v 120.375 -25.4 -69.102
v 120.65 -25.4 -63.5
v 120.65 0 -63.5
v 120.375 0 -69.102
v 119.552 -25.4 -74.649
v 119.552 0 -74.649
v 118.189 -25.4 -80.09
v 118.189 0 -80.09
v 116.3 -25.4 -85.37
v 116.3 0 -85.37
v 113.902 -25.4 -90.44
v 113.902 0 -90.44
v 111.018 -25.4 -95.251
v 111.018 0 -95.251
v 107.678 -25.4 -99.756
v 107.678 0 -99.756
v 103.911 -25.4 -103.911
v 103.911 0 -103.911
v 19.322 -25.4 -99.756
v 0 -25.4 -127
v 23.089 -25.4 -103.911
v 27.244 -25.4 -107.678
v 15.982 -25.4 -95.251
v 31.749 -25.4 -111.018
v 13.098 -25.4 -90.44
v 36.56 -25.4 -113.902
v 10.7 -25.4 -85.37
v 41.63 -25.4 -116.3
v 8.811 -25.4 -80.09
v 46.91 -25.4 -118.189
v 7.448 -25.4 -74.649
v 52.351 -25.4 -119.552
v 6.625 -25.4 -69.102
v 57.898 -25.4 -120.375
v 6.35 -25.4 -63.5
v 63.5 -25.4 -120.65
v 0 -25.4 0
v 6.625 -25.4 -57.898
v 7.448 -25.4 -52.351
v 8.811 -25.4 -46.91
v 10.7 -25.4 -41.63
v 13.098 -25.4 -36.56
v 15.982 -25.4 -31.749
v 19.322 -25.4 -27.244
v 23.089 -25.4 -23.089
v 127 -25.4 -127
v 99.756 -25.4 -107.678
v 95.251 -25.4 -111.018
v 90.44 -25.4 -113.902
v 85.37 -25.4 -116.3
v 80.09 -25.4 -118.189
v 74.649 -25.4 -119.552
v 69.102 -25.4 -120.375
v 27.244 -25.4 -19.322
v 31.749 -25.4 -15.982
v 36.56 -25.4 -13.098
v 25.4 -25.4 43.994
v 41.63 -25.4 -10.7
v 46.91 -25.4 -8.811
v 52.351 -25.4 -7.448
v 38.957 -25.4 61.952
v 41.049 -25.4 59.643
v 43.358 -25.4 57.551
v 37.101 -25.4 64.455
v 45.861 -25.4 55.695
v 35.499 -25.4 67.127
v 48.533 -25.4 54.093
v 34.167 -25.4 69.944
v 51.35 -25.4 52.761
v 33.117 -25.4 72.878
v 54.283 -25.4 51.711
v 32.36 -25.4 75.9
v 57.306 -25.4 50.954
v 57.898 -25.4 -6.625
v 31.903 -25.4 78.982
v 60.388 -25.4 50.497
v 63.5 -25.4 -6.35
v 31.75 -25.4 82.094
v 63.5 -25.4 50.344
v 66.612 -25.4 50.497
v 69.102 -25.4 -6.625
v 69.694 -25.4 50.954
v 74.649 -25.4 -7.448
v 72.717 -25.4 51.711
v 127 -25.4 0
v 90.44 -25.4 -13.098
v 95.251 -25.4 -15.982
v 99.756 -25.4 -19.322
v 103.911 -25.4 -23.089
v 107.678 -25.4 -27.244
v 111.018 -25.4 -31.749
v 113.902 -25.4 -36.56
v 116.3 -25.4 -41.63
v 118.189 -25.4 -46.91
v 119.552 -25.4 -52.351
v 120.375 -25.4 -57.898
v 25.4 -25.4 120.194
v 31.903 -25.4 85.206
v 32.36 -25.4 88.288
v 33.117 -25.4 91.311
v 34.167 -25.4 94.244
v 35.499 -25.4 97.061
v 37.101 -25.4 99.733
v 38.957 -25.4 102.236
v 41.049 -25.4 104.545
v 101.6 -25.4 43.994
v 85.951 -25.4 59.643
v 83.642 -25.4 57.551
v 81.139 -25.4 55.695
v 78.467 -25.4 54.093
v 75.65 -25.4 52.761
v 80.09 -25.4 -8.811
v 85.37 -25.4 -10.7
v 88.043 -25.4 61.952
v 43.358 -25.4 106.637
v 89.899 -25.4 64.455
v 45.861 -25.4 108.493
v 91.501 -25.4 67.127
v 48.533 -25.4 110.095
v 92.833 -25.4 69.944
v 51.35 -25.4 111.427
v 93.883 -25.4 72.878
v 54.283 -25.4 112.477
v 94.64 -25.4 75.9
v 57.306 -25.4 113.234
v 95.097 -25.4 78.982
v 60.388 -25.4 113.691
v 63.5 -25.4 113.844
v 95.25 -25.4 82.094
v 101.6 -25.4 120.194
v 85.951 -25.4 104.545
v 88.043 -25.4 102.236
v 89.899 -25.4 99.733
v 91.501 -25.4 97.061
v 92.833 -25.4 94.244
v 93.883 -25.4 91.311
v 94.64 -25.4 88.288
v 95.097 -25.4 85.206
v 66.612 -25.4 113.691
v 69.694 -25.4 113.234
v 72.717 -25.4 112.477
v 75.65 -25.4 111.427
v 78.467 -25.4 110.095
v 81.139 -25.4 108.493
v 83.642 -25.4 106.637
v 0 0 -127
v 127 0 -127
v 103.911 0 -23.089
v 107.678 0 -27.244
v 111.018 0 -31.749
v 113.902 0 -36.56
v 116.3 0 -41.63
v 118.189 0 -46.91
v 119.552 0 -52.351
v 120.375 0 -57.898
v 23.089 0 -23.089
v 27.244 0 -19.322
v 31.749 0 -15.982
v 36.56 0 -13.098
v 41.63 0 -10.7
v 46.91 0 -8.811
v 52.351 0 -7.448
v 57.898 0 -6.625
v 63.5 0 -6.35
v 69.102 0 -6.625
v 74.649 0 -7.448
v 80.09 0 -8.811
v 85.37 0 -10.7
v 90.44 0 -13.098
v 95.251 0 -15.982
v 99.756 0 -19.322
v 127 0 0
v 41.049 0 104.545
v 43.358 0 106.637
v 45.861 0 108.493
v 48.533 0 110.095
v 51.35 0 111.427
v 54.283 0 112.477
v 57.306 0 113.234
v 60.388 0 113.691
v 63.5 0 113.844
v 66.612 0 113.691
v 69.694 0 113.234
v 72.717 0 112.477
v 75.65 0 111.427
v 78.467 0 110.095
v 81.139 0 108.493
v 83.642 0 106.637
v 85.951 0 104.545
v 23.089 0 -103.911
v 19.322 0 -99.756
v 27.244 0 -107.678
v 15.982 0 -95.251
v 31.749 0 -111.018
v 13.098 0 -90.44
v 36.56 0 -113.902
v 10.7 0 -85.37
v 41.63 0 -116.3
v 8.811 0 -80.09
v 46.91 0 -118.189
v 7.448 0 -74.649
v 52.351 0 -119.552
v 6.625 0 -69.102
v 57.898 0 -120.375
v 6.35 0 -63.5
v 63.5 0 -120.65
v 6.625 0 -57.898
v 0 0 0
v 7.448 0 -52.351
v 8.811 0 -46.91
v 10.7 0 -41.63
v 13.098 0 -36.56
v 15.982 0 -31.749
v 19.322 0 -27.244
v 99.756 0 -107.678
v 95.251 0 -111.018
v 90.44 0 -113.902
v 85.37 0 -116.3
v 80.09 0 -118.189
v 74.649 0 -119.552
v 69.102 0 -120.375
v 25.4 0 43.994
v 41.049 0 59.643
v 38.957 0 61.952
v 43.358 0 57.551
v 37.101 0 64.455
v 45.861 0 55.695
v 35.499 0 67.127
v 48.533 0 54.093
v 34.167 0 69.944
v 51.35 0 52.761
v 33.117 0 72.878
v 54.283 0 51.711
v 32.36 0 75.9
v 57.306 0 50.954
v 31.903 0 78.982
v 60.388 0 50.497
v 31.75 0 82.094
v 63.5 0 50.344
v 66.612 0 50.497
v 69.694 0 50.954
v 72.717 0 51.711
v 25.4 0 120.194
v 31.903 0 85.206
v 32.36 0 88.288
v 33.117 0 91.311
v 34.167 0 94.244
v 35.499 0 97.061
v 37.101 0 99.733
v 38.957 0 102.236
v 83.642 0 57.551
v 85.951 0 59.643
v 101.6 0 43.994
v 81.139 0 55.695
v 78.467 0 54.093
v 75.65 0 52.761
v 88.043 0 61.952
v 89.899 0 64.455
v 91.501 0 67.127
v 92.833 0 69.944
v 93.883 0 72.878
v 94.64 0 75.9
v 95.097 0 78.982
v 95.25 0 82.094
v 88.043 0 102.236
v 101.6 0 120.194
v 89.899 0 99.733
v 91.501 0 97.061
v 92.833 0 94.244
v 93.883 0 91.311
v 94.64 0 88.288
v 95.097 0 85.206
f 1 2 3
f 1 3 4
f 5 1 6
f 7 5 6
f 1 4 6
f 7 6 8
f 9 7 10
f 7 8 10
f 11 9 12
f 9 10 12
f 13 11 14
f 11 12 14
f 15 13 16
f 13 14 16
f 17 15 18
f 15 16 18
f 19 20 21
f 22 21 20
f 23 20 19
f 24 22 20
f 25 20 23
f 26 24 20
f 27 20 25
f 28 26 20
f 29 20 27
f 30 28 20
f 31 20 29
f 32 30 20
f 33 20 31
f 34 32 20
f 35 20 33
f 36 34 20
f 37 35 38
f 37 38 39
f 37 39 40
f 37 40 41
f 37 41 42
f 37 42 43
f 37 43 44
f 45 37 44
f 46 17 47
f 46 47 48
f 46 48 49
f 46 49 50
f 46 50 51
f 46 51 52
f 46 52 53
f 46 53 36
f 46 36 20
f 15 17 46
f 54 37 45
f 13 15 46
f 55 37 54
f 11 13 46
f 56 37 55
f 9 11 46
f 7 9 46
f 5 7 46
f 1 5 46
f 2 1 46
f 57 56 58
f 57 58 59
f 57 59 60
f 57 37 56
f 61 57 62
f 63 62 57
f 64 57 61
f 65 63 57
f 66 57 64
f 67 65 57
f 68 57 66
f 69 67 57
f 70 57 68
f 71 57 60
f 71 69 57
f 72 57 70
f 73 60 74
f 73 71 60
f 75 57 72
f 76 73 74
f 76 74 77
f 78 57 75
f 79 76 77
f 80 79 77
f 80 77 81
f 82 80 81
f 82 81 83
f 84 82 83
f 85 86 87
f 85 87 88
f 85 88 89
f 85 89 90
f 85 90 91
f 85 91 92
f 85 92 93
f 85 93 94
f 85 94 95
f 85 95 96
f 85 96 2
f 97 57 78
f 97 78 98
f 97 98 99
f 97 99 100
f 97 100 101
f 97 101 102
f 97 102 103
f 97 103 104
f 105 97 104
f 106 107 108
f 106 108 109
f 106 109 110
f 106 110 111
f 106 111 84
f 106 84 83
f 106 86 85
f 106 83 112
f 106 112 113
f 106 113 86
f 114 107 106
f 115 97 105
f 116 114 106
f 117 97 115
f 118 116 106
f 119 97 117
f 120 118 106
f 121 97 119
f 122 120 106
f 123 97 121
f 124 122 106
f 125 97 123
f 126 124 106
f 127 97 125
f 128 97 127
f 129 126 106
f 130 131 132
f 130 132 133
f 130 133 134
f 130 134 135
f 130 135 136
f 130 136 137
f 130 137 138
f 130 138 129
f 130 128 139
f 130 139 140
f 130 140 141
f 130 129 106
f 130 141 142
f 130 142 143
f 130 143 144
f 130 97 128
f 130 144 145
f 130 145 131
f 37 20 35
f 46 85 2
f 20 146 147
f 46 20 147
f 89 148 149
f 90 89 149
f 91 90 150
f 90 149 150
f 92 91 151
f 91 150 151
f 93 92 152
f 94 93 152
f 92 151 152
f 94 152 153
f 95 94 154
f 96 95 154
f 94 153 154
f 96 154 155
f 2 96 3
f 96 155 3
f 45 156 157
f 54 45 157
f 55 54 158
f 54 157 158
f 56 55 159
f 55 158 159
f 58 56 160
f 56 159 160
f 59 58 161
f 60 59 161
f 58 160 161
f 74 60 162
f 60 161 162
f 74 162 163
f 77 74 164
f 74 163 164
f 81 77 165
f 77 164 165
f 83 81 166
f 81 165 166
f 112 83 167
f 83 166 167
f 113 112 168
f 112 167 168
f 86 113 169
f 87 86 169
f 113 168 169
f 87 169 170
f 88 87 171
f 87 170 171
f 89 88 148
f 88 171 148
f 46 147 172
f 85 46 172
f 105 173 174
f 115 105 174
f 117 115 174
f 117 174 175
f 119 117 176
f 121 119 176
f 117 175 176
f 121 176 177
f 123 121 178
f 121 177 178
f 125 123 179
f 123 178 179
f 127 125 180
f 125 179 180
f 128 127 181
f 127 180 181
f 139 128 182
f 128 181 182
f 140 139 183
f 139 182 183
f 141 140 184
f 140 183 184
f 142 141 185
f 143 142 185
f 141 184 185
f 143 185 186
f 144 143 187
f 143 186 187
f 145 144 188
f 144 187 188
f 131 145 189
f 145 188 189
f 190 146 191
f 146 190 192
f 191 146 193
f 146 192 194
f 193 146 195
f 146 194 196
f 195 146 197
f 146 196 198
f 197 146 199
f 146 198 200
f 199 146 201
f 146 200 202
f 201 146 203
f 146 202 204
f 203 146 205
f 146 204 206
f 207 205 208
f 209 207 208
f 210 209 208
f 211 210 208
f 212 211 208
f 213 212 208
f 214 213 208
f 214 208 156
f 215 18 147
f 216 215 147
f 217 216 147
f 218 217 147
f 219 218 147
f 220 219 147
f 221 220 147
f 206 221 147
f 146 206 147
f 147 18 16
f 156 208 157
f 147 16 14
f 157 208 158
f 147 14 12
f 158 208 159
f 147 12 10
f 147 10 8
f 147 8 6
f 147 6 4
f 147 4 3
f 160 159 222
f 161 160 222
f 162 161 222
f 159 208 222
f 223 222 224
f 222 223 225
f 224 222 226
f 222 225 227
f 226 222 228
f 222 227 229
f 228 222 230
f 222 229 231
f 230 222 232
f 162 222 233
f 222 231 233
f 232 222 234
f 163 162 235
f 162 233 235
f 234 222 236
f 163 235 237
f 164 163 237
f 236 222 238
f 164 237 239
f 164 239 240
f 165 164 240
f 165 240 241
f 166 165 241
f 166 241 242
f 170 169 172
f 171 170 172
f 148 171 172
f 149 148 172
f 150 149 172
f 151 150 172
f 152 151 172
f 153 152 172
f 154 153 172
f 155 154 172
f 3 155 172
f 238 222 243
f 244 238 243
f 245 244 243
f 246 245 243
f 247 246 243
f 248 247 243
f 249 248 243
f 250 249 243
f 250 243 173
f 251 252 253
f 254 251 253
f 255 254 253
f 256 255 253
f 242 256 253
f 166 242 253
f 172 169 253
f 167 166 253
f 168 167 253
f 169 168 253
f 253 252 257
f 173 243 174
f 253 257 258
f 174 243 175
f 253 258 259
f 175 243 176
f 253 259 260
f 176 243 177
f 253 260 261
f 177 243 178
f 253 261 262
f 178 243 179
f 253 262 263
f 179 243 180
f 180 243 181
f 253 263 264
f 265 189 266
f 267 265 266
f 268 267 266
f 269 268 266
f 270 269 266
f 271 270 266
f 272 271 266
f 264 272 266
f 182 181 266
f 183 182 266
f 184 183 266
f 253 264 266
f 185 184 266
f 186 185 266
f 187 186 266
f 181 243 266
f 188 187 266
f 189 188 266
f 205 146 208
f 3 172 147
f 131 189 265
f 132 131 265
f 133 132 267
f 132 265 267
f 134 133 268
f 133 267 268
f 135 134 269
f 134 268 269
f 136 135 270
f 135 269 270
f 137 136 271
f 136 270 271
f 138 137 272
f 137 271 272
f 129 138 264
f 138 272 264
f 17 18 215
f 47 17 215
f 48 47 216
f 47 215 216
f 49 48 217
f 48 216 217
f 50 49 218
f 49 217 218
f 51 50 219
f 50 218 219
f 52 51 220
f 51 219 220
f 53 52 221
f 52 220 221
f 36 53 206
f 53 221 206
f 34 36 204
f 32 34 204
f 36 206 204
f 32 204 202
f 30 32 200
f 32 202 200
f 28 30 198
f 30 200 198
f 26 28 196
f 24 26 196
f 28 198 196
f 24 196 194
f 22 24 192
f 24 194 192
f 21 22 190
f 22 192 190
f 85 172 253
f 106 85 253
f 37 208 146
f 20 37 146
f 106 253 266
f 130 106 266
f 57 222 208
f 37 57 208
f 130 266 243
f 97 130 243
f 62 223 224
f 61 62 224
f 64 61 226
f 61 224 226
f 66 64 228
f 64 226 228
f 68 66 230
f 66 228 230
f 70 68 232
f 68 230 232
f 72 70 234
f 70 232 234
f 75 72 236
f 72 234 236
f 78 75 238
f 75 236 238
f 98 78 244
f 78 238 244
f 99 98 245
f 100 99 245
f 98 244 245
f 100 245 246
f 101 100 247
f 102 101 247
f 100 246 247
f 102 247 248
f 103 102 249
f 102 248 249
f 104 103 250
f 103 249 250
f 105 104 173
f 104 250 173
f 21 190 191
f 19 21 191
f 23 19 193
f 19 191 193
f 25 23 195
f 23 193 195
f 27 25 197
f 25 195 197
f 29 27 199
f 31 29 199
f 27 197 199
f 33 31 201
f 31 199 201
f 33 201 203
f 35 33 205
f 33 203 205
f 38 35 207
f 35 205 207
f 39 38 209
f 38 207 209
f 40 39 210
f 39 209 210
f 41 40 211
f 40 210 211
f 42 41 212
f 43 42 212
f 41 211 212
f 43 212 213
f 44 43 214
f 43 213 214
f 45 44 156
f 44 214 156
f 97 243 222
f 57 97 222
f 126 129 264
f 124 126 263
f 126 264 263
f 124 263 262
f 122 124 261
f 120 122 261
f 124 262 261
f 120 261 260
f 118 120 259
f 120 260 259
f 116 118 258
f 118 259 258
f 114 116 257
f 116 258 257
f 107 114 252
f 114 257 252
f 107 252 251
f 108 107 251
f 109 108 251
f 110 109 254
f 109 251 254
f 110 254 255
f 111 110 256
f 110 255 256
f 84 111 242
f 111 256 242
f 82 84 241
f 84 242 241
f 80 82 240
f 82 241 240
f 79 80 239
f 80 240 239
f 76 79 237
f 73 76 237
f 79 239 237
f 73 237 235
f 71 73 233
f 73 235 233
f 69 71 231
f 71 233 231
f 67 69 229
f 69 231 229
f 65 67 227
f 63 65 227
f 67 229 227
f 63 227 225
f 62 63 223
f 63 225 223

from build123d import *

# Parameters (mm, degrees)
F1_DEPTH = 25.4


with BuildPart() as f1:
    # F0 (on Front) → F1 (new body)
    with BuildSketch(Plane.XZ):
        Polygon((25.4, 43.994091), (0, 0), (127, 0), (101.6, 43.994091), align=None)
        with BuildLine():
            Line((23.088847, -103.911153), (0, -127))
            Line((0, -127), (127, -127))
            Line((127, -127), (103.911153, -103.911153))
            ThreePointArc((103.911153, -103.911153), (63.5, -120.65), (23.088847, -103.911153))
        make_face()
        with BuildLine():
            Line((23.088847, -23.088847), (0, 0))
            Line((0, 0), (0, -127))
            Line((0, -127), (23.088847, -103.911153))
            ThreePointArc((23.088847, -103.911153), (6.35, -63.5), (23.088847, -23.088847))
        make_face()
        with BuildLine():
            Line((127, -127), (127, 0))
            Line((127, 0), (103.911153, -23.088847))
            ThreePointArc((103.911153, -23.088847), (116.299715, -41.629642), (120.65, -63.5))
            ThreePointArc((120.65, -63.5), (116.299715, -85.370358), (103.911153, -103.911153))
            Line((103.911153, -103.911153), (127, -127))
        make_face()
        with BuildLine():
            Line((25.4, 120.194091), (25.4, 43.994091))
            Line((25.4, 43.994091), (41.04936, 59.64345))
            ThreePointArc((41.04936, 59.64345), (31.75, 82.094091), (41.04936, 104.544731))
            Line((41.04936, 104.544731), (25.4, 120.194091))
        make_face()
        with BuildLine():
            Line((85.95064, 59.64345), (101.6, 43.994091))
            Line((101.6, 43.994091), (101.6, 120.194091))
            Line((101.6, 120.194091), (85.95064, 104.544731))
            ThreePointArc((85.95064, 104.544731), (92.833175, 94.244289), (95.25, 82.094091))
            ThreePointArc((95.25, 82.094091), (92.833175, 69.943892), (85.95064, 59.64345))
        make_face()
        with BuildLine():
            Line((127, 0), (0, 0))
            Line((0, 0), (23.088847, -23.088847))
            ThreePointArc((23.088847, -23.088847), (63.5, -6.35), (103.911153, -23.088847))
            Line((103.911153, -23.088847), (127, 0))
        make_face()
        with BuildLine():
            Line((41.04936, 59.64345), (25.4, 43.994091))
            Line((25.4, 43.994091), (101.6, 43.994091))
            Line((101.6, 43.994091), (85.95064, 59.64345))
            ThreePointArc((85.95064, 59.64345), (63.5, 50.344091), (41.04936, 59.64345))
        make_face()
        with BuildLine():
            Line((101.6, 120.194091), (25.4, 120.194091))
            Line((25.4, 120.194091), (41.04936, 104.544731))
            ThreePointArc((41.04936, 104.544731), (63.5, 113.844091), (85.95064, 104.544731))
            Line((85.95064, 104.544731), (101.6, 120.194091))
        make_face()
    extrude(amount=F1_DEPTH)


solid = f1.part
